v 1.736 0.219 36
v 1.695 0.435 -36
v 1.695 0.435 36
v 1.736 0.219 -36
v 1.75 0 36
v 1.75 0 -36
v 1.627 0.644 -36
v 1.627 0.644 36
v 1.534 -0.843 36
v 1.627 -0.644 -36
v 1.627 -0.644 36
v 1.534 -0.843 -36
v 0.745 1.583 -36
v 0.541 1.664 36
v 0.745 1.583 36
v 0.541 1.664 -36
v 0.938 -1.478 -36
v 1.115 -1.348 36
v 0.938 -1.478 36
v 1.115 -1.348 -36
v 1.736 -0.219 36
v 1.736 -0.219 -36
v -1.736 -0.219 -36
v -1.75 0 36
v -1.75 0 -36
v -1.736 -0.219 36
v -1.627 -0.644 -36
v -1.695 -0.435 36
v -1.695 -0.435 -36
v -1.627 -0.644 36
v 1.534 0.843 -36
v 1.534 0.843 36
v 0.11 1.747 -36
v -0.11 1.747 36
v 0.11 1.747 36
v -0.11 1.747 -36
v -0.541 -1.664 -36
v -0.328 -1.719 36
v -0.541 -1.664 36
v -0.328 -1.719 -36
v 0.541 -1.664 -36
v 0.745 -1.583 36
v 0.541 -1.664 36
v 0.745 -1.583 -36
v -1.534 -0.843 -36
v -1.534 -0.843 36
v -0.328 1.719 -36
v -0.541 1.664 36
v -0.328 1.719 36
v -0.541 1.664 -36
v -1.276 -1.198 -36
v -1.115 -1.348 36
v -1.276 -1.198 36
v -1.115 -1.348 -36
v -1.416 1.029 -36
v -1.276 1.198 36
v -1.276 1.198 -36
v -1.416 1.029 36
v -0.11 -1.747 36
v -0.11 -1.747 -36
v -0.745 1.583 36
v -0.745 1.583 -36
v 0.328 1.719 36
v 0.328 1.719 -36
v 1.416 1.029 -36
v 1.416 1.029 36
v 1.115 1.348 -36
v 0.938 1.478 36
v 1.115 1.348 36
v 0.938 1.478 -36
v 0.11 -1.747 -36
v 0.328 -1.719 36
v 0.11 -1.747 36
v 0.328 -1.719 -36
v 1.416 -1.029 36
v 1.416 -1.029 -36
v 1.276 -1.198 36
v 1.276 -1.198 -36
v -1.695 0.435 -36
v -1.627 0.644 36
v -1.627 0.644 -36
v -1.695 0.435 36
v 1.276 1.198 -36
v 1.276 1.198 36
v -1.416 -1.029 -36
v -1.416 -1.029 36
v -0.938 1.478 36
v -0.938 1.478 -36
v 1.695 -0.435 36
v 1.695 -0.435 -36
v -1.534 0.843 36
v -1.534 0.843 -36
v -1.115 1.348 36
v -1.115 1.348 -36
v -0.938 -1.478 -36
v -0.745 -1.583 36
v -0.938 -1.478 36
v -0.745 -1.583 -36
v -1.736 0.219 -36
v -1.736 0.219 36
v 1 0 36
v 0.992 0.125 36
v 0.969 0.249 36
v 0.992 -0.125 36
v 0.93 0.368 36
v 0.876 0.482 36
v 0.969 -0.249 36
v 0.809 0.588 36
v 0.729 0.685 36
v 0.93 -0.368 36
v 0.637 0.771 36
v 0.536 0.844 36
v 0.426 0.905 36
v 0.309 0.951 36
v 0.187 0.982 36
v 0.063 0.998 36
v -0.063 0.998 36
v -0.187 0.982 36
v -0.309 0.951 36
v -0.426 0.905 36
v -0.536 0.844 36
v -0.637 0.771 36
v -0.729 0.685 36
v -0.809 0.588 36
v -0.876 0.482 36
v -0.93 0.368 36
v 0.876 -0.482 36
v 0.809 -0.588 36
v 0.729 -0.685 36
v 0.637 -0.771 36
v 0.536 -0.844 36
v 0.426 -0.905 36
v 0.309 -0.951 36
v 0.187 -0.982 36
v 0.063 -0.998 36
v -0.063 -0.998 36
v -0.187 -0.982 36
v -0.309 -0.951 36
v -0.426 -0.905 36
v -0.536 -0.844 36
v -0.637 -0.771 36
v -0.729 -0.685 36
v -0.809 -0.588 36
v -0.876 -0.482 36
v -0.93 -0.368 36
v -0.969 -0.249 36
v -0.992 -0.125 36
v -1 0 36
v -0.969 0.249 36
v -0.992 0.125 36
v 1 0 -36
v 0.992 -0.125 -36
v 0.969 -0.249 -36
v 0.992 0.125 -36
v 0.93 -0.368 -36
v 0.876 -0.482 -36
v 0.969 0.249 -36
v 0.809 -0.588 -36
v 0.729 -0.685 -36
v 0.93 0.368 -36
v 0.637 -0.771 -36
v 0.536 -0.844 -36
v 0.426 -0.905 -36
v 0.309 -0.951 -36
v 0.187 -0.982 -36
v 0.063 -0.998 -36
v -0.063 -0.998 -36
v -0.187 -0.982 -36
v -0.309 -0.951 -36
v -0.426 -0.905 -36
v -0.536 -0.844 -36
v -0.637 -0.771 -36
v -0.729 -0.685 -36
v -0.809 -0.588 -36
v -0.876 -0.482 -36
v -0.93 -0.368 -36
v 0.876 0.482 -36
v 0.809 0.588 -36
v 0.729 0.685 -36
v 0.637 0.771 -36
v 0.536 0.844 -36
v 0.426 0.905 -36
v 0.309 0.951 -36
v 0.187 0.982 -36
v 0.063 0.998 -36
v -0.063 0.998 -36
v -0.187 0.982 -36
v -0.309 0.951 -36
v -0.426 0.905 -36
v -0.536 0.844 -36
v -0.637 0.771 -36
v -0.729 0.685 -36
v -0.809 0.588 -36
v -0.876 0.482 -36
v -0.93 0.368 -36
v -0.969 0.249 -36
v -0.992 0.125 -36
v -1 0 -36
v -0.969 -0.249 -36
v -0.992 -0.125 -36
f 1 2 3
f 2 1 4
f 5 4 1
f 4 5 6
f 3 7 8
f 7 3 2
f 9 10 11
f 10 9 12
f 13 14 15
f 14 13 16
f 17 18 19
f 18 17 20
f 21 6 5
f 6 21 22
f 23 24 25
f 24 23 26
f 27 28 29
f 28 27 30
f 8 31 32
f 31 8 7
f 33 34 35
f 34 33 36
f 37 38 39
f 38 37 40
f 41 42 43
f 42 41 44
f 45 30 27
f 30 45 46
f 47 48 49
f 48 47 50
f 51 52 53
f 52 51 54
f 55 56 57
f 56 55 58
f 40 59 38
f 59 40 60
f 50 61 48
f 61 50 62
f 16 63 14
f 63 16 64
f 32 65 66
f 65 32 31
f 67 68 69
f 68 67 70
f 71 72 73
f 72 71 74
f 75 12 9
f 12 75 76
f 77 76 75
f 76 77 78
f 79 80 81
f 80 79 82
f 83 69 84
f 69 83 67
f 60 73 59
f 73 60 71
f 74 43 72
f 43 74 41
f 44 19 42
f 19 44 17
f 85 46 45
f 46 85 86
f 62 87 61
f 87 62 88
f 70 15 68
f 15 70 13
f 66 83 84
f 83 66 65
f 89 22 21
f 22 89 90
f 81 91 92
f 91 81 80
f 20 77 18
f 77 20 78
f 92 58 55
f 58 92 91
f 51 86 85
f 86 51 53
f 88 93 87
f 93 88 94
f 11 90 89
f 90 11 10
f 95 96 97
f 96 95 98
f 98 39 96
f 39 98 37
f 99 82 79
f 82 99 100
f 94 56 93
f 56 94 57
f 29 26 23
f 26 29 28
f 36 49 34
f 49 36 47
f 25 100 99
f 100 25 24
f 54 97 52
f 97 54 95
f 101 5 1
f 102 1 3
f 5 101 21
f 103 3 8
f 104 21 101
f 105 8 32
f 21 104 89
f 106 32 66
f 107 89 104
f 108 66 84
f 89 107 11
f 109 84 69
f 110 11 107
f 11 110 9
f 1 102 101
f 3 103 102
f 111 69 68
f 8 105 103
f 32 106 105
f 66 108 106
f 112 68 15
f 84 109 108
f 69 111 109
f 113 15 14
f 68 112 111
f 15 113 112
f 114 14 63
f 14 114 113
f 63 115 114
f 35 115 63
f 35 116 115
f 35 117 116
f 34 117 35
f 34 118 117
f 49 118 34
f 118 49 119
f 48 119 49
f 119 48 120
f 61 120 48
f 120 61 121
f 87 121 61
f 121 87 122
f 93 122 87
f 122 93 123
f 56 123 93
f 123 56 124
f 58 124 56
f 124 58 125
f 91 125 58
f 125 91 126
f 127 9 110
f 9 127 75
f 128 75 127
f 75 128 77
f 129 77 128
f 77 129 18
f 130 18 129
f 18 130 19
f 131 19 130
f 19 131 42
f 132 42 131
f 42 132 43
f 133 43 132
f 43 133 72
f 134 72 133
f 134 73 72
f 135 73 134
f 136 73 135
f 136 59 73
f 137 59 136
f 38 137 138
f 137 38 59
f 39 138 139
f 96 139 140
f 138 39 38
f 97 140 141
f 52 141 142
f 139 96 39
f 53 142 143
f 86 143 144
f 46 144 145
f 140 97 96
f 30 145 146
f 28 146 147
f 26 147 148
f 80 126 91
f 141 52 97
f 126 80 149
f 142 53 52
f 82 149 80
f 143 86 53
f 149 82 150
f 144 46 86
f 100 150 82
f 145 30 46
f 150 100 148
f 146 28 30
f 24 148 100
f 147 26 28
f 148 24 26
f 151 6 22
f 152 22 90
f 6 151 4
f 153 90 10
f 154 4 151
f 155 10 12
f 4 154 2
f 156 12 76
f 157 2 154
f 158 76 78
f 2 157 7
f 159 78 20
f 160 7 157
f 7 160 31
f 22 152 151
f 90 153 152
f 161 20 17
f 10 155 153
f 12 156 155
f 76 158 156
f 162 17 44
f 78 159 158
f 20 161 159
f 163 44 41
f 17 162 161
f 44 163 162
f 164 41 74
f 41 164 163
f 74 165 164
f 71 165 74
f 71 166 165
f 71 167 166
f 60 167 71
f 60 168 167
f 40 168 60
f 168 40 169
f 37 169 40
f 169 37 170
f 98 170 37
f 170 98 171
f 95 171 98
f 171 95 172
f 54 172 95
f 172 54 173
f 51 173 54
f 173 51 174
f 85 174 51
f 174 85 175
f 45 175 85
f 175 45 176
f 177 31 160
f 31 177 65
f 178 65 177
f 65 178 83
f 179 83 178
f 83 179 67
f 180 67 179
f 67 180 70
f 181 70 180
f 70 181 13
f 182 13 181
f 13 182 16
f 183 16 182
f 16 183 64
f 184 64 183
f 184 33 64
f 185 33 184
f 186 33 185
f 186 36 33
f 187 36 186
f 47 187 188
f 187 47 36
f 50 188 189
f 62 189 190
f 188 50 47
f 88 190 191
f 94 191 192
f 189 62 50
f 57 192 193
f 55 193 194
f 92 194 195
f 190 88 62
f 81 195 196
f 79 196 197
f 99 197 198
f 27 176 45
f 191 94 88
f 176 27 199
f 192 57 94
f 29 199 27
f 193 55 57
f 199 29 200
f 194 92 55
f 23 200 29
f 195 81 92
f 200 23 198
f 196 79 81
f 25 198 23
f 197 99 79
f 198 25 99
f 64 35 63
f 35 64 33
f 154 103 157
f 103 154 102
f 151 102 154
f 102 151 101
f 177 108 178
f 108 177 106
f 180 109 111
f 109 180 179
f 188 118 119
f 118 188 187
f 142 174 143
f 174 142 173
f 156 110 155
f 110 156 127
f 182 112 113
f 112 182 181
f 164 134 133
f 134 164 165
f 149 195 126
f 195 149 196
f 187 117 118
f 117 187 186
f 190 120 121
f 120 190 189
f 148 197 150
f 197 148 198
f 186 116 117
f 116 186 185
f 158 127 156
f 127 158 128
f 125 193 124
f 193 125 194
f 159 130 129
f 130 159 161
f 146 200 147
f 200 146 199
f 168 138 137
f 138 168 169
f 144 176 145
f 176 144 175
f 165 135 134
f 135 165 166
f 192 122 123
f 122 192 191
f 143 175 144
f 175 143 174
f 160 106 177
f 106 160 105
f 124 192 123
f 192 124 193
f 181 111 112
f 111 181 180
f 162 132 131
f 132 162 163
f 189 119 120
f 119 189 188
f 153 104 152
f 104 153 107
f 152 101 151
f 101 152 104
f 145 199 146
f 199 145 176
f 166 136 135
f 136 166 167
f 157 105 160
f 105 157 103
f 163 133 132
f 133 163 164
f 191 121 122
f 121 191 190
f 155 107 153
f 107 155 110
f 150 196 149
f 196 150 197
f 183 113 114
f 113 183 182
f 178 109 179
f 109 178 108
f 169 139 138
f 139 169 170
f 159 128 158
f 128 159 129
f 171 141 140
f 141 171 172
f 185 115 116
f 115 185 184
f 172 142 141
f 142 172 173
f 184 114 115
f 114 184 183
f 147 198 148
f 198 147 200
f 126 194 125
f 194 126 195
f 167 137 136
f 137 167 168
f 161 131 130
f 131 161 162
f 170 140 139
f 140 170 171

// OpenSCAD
$fn = 50;


difference() {
	union() {
		translate(v = [0, 0, -36.0000000000]) {
			cylinder(h = 72, r = 1.7500000000);
		}
	}
	union() {
		translate(v = [0, 0, -100.0000000000]) {
			cylinder(h = 200, r = 1.0000000000);
		}
	}
}
